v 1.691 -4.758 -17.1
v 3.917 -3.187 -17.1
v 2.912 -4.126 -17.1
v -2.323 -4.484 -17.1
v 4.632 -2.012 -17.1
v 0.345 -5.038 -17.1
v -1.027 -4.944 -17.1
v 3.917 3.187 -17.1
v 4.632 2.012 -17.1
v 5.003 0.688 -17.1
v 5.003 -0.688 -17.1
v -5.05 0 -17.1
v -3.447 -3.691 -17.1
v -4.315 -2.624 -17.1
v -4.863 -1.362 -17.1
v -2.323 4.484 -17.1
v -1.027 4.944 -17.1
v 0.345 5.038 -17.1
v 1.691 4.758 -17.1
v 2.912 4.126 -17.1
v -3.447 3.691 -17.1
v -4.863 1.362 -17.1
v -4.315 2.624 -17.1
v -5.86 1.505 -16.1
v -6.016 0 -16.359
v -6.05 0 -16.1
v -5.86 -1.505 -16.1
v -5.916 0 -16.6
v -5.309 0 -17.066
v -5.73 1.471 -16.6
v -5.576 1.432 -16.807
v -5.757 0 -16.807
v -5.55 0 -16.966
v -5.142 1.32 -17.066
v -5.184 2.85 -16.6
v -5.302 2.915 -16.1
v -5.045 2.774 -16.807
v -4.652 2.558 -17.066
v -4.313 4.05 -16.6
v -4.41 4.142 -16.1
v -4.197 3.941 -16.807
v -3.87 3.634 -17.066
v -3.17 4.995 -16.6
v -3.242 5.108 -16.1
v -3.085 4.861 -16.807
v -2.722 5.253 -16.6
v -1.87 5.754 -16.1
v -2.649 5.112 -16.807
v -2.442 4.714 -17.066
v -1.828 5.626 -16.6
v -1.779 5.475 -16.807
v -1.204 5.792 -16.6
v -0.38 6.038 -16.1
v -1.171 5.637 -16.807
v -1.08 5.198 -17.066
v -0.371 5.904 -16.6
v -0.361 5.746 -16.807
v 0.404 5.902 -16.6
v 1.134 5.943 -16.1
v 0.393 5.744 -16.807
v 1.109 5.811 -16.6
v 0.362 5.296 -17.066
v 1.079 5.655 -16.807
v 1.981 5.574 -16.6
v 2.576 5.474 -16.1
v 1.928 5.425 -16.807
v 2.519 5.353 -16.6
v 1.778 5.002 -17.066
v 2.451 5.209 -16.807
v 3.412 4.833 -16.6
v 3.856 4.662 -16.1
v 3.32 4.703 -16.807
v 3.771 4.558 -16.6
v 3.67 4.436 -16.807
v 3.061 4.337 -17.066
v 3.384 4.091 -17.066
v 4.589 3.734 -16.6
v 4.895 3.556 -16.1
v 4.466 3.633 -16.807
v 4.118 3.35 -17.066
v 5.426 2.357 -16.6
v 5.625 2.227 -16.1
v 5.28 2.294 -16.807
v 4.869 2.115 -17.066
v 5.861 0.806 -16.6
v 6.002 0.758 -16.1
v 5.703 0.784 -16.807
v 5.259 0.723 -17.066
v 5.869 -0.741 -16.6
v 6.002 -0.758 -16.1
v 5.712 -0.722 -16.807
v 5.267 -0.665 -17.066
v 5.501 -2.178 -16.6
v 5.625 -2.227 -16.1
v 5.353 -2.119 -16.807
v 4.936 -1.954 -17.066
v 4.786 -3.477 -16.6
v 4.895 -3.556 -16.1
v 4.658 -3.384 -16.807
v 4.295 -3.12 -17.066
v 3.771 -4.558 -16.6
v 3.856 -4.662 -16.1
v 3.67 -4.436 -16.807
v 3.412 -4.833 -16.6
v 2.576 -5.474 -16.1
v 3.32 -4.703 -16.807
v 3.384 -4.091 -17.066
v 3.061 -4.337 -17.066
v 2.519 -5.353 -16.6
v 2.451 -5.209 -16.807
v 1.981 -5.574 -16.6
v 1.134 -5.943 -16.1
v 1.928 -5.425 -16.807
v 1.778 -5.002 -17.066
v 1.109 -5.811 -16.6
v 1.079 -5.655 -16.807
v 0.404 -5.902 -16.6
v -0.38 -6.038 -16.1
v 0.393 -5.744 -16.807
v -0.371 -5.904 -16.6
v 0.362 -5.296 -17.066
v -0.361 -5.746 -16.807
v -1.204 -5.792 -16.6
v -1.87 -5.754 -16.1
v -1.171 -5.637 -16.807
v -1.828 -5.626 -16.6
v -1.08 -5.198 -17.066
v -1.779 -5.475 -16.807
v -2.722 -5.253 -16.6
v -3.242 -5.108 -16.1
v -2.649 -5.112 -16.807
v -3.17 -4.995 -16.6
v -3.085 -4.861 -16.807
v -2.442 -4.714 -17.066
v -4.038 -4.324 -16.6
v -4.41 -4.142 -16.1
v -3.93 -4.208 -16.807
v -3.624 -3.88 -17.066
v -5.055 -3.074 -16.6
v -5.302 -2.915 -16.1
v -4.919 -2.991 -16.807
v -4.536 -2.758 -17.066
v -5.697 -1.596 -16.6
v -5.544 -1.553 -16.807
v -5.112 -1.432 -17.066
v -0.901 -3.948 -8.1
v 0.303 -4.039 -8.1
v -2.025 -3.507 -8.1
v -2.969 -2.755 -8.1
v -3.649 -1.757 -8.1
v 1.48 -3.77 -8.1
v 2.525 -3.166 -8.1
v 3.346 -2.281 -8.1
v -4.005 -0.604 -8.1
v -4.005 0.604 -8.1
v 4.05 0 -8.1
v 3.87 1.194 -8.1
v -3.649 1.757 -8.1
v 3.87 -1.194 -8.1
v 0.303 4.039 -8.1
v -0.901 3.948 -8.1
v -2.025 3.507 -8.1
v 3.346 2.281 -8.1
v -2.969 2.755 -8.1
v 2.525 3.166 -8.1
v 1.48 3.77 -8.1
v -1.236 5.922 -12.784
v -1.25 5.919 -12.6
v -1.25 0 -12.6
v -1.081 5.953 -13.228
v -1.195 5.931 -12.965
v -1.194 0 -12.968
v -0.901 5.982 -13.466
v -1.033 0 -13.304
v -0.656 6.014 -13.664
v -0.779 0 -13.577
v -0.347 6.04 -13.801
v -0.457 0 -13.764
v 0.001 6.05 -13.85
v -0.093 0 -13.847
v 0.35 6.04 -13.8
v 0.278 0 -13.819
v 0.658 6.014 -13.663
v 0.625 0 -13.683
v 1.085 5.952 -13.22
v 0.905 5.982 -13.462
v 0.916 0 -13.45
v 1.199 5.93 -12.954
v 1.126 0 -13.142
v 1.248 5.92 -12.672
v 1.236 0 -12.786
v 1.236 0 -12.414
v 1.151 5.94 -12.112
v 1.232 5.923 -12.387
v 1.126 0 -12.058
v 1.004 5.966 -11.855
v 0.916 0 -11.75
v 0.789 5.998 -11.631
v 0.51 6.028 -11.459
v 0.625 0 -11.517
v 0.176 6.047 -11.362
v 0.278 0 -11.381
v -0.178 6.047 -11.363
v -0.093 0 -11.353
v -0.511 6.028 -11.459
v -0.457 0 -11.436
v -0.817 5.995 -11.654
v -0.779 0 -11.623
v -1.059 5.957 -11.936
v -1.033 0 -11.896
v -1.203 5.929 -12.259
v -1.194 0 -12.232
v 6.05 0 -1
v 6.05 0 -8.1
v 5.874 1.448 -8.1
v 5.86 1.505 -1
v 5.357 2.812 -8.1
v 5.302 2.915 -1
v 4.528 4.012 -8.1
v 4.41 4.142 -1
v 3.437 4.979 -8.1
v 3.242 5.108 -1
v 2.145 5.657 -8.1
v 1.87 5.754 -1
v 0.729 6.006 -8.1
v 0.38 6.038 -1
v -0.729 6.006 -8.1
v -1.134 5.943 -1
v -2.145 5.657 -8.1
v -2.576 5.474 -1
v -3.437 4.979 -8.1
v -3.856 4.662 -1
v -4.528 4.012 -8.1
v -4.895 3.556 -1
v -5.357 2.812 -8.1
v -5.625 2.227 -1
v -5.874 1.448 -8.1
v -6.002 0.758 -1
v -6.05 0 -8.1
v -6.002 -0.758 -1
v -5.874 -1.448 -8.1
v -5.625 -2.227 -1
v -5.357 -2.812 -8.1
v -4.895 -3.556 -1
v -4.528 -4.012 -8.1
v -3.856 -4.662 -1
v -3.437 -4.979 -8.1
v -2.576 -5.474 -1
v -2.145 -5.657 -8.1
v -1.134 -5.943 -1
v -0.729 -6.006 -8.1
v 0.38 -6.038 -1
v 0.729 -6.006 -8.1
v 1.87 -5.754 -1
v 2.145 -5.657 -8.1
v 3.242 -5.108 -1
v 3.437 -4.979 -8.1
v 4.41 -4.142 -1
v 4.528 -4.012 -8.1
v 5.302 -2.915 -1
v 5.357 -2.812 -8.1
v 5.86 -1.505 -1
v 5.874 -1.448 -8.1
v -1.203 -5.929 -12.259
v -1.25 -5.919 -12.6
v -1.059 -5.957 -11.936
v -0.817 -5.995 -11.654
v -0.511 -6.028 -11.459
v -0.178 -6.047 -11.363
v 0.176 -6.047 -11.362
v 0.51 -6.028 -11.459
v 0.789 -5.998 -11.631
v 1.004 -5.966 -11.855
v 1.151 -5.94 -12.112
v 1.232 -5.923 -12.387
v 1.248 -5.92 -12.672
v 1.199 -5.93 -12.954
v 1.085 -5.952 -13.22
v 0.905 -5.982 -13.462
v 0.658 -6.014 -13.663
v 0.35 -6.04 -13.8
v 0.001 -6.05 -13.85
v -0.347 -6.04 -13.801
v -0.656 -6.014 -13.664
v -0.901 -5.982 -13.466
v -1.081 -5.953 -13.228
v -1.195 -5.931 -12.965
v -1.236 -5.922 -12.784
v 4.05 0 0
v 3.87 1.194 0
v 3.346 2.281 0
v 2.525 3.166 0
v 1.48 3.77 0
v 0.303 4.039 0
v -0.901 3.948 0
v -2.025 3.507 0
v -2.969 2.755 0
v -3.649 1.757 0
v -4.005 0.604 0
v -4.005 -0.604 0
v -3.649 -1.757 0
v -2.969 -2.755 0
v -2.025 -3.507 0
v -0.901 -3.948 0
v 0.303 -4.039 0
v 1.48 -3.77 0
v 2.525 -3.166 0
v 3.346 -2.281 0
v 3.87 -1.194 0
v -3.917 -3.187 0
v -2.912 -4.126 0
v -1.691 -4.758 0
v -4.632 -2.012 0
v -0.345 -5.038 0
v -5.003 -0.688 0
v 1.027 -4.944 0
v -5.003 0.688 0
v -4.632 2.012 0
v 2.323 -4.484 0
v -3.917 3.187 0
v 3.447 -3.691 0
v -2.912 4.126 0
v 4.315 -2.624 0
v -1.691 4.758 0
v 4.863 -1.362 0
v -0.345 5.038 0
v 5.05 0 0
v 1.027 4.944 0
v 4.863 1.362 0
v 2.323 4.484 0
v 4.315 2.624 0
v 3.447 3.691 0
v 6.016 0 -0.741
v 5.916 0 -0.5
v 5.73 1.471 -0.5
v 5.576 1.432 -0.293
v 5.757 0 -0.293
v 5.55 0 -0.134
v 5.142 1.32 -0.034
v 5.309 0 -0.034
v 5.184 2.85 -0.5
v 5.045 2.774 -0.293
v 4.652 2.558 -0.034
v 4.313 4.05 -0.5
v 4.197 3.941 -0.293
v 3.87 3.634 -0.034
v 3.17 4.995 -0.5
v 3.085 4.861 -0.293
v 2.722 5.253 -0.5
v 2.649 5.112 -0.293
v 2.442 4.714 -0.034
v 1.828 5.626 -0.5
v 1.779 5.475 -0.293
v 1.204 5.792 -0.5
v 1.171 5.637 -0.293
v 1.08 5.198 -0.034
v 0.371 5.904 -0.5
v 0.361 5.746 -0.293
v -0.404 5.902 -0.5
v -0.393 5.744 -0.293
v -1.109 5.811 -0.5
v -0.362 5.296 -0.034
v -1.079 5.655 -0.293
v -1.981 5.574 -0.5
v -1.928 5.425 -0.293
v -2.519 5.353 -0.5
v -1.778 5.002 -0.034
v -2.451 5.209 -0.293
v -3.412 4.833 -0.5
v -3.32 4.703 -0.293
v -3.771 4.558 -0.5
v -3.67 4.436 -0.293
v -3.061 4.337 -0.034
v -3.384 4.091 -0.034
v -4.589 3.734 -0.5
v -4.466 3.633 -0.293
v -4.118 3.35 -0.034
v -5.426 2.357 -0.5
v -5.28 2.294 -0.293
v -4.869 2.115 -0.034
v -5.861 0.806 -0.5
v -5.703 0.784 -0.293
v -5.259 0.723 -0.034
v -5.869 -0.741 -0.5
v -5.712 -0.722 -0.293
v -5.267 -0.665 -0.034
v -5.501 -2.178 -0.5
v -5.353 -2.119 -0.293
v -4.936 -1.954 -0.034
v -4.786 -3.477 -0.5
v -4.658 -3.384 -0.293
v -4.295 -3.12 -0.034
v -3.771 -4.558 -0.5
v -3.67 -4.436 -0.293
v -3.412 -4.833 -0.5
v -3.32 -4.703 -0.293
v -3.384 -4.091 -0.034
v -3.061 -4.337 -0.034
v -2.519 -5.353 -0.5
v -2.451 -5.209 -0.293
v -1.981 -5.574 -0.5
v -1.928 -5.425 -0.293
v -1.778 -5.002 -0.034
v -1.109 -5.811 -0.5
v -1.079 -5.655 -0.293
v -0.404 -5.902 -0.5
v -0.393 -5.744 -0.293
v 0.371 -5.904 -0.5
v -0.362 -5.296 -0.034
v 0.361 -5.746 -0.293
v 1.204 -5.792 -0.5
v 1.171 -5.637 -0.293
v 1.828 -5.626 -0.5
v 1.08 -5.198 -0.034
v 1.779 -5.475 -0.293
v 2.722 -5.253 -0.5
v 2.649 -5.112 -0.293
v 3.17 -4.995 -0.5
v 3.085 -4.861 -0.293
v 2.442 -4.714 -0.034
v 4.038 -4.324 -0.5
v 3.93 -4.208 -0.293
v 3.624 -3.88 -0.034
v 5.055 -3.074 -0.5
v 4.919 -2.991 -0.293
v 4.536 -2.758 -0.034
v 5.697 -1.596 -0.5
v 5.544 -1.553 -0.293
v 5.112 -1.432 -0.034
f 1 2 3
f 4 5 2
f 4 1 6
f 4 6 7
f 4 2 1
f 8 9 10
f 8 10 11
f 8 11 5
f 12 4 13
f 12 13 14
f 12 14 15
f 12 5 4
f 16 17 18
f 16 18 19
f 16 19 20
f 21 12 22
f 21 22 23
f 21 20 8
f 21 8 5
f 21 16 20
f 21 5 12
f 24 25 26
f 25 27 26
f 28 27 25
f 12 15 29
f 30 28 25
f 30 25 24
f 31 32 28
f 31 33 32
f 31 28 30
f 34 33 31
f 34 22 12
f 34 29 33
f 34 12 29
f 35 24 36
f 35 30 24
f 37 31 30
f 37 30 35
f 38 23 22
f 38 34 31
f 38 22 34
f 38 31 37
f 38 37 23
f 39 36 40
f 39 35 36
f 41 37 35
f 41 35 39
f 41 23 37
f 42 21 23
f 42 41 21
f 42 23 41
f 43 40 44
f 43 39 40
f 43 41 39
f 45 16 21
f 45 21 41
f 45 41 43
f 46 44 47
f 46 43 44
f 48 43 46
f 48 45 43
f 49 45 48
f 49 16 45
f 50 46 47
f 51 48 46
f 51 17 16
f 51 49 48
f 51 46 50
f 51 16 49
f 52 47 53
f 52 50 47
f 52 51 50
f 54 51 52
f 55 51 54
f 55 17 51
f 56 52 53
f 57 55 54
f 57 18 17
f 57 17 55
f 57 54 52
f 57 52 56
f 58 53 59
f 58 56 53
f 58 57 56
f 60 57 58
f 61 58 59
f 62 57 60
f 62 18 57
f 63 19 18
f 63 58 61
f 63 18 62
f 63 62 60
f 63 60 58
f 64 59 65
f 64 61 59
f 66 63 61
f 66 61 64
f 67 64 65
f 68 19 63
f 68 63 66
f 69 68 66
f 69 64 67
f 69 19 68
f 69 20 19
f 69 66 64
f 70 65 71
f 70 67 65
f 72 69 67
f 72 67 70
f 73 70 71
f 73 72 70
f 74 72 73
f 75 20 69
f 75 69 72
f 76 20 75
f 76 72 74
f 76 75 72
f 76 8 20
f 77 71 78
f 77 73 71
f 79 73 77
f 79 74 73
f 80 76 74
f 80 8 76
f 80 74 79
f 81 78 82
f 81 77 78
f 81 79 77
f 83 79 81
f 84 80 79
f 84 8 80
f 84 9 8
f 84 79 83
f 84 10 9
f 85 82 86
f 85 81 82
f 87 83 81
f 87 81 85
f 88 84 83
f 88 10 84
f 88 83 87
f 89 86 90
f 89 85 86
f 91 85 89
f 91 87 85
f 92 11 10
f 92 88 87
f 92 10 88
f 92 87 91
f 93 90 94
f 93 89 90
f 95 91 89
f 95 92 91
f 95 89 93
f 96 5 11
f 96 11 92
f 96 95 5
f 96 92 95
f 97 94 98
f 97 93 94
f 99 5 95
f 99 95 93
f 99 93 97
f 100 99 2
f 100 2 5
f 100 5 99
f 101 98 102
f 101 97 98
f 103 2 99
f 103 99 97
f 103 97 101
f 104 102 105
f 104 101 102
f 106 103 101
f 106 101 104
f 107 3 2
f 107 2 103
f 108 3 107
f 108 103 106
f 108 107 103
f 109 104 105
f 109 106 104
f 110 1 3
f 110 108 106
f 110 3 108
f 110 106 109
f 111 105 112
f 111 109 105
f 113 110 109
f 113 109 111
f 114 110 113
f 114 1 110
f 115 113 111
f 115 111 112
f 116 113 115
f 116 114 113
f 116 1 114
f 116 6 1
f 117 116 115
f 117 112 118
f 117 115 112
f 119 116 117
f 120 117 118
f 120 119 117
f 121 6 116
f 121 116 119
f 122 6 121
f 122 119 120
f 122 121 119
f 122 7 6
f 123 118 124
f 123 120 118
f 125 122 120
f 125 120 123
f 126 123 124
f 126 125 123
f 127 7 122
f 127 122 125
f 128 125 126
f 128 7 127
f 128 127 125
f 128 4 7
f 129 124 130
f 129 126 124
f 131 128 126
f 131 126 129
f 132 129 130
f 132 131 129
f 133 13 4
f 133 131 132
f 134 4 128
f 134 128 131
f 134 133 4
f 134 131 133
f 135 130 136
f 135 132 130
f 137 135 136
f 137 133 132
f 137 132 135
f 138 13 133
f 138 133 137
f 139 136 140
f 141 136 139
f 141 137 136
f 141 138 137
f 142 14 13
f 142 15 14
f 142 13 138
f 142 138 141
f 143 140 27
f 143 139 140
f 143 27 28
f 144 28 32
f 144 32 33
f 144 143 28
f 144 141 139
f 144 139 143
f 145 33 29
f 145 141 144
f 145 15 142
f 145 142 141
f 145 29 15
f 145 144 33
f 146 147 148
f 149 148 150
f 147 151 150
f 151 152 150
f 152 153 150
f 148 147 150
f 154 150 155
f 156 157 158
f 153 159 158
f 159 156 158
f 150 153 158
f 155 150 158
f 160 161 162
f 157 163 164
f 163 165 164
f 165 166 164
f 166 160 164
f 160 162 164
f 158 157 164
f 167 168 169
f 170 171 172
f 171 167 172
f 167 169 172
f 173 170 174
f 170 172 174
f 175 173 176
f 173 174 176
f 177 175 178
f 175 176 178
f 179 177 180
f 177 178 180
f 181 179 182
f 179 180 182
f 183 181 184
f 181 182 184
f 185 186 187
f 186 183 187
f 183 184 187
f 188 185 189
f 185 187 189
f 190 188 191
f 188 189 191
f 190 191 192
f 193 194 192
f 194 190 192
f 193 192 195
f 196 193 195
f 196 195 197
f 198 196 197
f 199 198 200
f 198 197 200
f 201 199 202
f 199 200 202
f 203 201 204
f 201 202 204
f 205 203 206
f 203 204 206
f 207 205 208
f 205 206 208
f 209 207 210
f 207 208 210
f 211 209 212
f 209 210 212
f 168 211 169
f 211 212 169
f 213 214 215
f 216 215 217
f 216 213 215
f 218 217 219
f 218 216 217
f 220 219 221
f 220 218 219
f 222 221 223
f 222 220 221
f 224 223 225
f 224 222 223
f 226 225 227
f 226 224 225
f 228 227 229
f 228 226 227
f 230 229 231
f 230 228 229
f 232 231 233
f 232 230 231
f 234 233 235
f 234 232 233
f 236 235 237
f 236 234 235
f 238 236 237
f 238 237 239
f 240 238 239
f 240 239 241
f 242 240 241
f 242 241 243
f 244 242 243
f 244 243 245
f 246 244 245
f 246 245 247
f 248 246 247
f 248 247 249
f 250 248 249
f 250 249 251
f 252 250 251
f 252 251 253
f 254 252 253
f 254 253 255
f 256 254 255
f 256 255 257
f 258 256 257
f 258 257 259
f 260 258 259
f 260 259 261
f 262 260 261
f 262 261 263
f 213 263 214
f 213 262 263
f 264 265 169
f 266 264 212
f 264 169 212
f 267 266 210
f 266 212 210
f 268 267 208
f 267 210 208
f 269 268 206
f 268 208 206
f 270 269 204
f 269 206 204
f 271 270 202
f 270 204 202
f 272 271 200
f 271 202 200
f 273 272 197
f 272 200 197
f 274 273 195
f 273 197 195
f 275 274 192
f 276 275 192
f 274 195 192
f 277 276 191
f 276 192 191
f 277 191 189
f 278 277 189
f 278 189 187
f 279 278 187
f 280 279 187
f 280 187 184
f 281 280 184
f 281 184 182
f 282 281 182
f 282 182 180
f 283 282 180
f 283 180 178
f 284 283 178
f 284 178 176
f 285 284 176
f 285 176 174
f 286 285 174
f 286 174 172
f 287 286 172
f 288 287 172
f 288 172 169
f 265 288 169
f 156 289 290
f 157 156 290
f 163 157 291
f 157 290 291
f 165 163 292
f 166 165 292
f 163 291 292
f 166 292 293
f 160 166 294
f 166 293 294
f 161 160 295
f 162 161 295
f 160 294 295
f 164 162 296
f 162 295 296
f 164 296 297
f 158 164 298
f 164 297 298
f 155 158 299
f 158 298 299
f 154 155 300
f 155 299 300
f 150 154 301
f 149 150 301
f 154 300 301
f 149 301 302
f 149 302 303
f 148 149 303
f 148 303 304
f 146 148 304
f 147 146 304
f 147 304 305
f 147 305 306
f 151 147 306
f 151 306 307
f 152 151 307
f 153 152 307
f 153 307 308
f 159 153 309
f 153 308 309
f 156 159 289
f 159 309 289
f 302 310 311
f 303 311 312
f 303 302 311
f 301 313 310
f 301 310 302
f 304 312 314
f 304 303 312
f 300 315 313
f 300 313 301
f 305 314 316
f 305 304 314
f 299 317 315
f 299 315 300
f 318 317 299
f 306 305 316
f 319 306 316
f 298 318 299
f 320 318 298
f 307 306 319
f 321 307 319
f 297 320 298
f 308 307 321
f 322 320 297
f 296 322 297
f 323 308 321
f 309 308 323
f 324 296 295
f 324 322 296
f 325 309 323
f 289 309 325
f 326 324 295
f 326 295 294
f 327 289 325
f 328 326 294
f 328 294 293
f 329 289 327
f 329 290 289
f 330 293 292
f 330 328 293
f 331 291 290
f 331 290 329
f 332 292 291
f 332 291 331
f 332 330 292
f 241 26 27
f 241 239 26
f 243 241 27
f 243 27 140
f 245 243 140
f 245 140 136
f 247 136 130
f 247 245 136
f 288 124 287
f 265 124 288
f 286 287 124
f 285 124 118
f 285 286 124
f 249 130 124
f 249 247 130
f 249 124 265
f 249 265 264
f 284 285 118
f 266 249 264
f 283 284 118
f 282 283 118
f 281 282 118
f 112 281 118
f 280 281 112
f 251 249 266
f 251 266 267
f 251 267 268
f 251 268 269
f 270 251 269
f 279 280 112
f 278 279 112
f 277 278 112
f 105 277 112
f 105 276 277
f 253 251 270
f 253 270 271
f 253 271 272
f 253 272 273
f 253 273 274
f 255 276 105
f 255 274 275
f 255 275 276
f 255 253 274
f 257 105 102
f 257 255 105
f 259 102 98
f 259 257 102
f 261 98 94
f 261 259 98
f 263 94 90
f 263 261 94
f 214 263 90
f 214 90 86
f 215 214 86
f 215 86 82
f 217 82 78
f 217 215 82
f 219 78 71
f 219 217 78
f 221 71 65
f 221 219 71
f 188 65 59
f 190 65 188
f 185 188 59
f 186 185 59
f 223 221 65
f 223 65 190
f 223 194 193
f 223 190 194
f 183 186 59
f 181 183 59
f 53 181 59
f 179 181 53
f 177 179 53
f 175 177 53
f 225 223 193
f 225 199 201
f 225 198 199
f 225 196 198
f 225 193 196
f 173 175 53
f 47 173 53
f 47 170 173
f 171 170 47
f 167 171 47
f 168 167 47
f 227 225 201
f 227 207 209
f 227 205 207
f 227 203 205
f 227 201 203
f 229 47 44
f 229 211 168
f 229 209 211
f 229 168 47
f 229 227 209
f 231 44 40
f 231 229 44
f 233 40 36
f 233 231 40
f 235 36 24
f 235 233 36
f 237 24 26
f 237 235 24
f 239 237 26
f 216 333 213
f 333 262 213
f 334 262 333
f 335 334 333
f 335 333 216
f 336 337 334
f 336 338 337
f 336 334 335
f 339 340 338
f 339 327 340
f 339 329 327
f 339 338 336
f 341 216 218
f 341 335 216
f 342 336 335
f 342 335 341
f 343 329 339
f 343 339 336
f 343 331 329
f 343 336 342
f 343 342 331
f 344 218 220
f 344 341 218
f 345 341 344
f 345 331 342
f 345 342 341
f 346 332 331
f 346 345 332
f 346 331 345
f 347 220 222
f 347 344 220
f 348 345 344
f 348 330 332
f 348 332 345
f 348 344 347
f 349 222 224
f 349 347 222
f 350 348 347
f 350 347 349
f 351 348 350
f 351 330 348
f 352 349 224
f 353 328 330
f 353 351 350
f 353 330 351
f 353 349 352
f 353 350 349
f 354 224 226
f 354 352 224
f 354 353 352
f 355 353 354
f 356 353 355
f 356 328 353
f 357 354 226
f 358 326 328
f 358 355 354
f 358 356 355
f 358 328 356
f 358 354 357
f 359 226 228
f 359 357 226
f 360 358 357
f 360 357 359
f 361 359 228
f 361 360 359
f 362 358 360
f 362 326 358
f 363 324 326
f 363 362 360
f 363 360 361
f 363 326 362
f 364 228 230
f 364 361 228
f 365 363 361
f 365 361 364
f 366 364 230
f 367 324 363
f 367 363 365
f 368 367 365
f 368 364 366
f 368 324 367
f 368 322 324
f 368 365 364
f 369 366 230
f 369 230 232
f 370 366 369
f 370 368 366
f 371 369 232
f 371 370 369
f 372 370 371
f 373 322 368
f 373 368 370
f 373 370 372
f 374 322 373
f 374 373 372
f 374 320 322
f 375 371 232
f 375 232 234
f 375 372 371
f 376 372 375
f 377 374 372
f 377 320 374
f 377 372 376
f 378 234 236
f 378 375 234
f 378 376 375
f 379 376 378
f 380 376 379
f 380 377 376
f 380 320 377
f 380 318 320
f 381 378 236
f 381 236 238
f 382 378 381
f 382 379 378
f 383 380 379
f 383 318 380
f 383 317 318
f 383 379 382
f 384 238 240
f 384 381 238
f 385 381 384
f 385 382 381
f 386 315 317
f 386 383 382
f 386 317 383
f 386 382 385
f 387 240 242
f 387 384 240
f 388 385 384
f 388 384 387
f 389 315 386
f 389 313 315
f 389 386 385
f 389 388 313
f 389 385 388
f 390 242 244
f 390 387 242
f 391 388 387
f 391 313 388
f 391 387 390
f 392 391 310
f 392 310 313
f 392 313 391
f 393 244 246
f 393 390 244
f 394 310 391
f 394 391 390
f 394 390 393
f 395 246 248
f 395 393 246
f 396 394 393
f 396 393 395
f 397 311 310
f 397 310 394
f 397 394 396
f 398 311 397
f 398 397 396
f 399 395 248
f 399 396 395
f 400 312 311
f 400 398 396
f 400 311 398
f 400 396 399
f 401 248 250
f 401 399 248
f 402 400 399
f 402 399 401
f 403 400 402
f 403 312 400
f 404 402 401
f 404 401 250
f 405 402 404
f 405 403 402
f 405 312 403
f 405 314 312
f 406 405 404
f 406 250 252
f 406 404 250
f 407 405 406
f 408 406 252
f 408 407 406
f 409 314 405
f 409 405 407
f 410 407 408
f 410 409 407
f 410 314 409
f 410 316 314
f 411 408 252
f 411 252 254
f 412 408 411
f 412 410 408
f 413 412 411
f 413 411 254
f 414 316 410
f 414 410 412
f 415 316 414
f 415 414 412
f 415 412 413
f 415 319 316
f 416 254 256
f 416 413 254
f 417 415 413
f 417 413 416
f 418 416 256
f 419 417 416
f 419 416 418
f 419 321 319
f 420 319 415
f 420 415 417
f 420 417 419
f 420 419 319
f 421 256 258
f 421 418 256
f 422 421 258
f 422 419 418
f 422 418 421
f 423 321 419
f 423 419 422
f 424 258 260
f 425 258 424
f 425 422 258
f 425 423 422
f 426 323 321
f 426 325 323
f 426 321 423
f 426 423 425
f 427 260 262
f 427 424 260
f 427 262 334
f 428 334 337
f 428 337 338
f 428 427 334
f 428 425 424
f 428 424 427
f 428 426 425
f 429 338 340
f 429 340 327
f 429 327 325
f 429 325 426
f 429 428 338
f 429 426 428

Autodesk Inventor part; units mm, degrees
ref_plane "YZ Plane" through (0, 0, 0) normal (1, 0, 0) x (0, 1, 0)
ref_plane "XZ Plane" through (0, 0, 0) normal (0, 1, 0) x (-1, 0, 0)
ref_plane "XY Plane" through (0, 0, 0) normal (0, 0, 1) x (1, 0, 0)
sketch "スケッチ1" plane through (0, 0, 0) normal (0, 0, 1) x (1, 0, 0)
  circle A0 centre (0, 0) radius 4.05
  circle A1 centre (0, 0) radius 6.05
  dimension "d0" = 8.1
  dimension "d1" = 2
extrude "押し出し1" add sketch "スケッチ1" against normal blind 8.1
sketch "スケッチ2" plane through (0, 0, -8.1) normal (0, 0, -1) x (-1, 0, 0)
  circle A0 centre (0, 0) radius 6.05
  circle A1 centre (0, 0) radius 6.05 projected
  dimension "d13" = 0
extrude "押し出し2" add sketch "スケッチ2" along normal blind 9
sketch "スケッチ3" plane through (0, 0, 0) normal (0, 1, 0) x (-1, 0, 0)
  circle A0 centre (0, -12.6) radius 1.25
  line L0 (4.05, -8.1) -> (-4.05, -8.1) projected
  point P0 (0, 0)
  dimension "d6" = 2.5
  dimension "d7" = 4.5
extrude "押し出し3" cut sketch "スケッチ3" along normal through all both and the other way through all
fillet "フィレット1" radius 1 2 edges at (6.05, 0, -17.1) (-6.05, 0, 0)
properties part number "parent_ver."
